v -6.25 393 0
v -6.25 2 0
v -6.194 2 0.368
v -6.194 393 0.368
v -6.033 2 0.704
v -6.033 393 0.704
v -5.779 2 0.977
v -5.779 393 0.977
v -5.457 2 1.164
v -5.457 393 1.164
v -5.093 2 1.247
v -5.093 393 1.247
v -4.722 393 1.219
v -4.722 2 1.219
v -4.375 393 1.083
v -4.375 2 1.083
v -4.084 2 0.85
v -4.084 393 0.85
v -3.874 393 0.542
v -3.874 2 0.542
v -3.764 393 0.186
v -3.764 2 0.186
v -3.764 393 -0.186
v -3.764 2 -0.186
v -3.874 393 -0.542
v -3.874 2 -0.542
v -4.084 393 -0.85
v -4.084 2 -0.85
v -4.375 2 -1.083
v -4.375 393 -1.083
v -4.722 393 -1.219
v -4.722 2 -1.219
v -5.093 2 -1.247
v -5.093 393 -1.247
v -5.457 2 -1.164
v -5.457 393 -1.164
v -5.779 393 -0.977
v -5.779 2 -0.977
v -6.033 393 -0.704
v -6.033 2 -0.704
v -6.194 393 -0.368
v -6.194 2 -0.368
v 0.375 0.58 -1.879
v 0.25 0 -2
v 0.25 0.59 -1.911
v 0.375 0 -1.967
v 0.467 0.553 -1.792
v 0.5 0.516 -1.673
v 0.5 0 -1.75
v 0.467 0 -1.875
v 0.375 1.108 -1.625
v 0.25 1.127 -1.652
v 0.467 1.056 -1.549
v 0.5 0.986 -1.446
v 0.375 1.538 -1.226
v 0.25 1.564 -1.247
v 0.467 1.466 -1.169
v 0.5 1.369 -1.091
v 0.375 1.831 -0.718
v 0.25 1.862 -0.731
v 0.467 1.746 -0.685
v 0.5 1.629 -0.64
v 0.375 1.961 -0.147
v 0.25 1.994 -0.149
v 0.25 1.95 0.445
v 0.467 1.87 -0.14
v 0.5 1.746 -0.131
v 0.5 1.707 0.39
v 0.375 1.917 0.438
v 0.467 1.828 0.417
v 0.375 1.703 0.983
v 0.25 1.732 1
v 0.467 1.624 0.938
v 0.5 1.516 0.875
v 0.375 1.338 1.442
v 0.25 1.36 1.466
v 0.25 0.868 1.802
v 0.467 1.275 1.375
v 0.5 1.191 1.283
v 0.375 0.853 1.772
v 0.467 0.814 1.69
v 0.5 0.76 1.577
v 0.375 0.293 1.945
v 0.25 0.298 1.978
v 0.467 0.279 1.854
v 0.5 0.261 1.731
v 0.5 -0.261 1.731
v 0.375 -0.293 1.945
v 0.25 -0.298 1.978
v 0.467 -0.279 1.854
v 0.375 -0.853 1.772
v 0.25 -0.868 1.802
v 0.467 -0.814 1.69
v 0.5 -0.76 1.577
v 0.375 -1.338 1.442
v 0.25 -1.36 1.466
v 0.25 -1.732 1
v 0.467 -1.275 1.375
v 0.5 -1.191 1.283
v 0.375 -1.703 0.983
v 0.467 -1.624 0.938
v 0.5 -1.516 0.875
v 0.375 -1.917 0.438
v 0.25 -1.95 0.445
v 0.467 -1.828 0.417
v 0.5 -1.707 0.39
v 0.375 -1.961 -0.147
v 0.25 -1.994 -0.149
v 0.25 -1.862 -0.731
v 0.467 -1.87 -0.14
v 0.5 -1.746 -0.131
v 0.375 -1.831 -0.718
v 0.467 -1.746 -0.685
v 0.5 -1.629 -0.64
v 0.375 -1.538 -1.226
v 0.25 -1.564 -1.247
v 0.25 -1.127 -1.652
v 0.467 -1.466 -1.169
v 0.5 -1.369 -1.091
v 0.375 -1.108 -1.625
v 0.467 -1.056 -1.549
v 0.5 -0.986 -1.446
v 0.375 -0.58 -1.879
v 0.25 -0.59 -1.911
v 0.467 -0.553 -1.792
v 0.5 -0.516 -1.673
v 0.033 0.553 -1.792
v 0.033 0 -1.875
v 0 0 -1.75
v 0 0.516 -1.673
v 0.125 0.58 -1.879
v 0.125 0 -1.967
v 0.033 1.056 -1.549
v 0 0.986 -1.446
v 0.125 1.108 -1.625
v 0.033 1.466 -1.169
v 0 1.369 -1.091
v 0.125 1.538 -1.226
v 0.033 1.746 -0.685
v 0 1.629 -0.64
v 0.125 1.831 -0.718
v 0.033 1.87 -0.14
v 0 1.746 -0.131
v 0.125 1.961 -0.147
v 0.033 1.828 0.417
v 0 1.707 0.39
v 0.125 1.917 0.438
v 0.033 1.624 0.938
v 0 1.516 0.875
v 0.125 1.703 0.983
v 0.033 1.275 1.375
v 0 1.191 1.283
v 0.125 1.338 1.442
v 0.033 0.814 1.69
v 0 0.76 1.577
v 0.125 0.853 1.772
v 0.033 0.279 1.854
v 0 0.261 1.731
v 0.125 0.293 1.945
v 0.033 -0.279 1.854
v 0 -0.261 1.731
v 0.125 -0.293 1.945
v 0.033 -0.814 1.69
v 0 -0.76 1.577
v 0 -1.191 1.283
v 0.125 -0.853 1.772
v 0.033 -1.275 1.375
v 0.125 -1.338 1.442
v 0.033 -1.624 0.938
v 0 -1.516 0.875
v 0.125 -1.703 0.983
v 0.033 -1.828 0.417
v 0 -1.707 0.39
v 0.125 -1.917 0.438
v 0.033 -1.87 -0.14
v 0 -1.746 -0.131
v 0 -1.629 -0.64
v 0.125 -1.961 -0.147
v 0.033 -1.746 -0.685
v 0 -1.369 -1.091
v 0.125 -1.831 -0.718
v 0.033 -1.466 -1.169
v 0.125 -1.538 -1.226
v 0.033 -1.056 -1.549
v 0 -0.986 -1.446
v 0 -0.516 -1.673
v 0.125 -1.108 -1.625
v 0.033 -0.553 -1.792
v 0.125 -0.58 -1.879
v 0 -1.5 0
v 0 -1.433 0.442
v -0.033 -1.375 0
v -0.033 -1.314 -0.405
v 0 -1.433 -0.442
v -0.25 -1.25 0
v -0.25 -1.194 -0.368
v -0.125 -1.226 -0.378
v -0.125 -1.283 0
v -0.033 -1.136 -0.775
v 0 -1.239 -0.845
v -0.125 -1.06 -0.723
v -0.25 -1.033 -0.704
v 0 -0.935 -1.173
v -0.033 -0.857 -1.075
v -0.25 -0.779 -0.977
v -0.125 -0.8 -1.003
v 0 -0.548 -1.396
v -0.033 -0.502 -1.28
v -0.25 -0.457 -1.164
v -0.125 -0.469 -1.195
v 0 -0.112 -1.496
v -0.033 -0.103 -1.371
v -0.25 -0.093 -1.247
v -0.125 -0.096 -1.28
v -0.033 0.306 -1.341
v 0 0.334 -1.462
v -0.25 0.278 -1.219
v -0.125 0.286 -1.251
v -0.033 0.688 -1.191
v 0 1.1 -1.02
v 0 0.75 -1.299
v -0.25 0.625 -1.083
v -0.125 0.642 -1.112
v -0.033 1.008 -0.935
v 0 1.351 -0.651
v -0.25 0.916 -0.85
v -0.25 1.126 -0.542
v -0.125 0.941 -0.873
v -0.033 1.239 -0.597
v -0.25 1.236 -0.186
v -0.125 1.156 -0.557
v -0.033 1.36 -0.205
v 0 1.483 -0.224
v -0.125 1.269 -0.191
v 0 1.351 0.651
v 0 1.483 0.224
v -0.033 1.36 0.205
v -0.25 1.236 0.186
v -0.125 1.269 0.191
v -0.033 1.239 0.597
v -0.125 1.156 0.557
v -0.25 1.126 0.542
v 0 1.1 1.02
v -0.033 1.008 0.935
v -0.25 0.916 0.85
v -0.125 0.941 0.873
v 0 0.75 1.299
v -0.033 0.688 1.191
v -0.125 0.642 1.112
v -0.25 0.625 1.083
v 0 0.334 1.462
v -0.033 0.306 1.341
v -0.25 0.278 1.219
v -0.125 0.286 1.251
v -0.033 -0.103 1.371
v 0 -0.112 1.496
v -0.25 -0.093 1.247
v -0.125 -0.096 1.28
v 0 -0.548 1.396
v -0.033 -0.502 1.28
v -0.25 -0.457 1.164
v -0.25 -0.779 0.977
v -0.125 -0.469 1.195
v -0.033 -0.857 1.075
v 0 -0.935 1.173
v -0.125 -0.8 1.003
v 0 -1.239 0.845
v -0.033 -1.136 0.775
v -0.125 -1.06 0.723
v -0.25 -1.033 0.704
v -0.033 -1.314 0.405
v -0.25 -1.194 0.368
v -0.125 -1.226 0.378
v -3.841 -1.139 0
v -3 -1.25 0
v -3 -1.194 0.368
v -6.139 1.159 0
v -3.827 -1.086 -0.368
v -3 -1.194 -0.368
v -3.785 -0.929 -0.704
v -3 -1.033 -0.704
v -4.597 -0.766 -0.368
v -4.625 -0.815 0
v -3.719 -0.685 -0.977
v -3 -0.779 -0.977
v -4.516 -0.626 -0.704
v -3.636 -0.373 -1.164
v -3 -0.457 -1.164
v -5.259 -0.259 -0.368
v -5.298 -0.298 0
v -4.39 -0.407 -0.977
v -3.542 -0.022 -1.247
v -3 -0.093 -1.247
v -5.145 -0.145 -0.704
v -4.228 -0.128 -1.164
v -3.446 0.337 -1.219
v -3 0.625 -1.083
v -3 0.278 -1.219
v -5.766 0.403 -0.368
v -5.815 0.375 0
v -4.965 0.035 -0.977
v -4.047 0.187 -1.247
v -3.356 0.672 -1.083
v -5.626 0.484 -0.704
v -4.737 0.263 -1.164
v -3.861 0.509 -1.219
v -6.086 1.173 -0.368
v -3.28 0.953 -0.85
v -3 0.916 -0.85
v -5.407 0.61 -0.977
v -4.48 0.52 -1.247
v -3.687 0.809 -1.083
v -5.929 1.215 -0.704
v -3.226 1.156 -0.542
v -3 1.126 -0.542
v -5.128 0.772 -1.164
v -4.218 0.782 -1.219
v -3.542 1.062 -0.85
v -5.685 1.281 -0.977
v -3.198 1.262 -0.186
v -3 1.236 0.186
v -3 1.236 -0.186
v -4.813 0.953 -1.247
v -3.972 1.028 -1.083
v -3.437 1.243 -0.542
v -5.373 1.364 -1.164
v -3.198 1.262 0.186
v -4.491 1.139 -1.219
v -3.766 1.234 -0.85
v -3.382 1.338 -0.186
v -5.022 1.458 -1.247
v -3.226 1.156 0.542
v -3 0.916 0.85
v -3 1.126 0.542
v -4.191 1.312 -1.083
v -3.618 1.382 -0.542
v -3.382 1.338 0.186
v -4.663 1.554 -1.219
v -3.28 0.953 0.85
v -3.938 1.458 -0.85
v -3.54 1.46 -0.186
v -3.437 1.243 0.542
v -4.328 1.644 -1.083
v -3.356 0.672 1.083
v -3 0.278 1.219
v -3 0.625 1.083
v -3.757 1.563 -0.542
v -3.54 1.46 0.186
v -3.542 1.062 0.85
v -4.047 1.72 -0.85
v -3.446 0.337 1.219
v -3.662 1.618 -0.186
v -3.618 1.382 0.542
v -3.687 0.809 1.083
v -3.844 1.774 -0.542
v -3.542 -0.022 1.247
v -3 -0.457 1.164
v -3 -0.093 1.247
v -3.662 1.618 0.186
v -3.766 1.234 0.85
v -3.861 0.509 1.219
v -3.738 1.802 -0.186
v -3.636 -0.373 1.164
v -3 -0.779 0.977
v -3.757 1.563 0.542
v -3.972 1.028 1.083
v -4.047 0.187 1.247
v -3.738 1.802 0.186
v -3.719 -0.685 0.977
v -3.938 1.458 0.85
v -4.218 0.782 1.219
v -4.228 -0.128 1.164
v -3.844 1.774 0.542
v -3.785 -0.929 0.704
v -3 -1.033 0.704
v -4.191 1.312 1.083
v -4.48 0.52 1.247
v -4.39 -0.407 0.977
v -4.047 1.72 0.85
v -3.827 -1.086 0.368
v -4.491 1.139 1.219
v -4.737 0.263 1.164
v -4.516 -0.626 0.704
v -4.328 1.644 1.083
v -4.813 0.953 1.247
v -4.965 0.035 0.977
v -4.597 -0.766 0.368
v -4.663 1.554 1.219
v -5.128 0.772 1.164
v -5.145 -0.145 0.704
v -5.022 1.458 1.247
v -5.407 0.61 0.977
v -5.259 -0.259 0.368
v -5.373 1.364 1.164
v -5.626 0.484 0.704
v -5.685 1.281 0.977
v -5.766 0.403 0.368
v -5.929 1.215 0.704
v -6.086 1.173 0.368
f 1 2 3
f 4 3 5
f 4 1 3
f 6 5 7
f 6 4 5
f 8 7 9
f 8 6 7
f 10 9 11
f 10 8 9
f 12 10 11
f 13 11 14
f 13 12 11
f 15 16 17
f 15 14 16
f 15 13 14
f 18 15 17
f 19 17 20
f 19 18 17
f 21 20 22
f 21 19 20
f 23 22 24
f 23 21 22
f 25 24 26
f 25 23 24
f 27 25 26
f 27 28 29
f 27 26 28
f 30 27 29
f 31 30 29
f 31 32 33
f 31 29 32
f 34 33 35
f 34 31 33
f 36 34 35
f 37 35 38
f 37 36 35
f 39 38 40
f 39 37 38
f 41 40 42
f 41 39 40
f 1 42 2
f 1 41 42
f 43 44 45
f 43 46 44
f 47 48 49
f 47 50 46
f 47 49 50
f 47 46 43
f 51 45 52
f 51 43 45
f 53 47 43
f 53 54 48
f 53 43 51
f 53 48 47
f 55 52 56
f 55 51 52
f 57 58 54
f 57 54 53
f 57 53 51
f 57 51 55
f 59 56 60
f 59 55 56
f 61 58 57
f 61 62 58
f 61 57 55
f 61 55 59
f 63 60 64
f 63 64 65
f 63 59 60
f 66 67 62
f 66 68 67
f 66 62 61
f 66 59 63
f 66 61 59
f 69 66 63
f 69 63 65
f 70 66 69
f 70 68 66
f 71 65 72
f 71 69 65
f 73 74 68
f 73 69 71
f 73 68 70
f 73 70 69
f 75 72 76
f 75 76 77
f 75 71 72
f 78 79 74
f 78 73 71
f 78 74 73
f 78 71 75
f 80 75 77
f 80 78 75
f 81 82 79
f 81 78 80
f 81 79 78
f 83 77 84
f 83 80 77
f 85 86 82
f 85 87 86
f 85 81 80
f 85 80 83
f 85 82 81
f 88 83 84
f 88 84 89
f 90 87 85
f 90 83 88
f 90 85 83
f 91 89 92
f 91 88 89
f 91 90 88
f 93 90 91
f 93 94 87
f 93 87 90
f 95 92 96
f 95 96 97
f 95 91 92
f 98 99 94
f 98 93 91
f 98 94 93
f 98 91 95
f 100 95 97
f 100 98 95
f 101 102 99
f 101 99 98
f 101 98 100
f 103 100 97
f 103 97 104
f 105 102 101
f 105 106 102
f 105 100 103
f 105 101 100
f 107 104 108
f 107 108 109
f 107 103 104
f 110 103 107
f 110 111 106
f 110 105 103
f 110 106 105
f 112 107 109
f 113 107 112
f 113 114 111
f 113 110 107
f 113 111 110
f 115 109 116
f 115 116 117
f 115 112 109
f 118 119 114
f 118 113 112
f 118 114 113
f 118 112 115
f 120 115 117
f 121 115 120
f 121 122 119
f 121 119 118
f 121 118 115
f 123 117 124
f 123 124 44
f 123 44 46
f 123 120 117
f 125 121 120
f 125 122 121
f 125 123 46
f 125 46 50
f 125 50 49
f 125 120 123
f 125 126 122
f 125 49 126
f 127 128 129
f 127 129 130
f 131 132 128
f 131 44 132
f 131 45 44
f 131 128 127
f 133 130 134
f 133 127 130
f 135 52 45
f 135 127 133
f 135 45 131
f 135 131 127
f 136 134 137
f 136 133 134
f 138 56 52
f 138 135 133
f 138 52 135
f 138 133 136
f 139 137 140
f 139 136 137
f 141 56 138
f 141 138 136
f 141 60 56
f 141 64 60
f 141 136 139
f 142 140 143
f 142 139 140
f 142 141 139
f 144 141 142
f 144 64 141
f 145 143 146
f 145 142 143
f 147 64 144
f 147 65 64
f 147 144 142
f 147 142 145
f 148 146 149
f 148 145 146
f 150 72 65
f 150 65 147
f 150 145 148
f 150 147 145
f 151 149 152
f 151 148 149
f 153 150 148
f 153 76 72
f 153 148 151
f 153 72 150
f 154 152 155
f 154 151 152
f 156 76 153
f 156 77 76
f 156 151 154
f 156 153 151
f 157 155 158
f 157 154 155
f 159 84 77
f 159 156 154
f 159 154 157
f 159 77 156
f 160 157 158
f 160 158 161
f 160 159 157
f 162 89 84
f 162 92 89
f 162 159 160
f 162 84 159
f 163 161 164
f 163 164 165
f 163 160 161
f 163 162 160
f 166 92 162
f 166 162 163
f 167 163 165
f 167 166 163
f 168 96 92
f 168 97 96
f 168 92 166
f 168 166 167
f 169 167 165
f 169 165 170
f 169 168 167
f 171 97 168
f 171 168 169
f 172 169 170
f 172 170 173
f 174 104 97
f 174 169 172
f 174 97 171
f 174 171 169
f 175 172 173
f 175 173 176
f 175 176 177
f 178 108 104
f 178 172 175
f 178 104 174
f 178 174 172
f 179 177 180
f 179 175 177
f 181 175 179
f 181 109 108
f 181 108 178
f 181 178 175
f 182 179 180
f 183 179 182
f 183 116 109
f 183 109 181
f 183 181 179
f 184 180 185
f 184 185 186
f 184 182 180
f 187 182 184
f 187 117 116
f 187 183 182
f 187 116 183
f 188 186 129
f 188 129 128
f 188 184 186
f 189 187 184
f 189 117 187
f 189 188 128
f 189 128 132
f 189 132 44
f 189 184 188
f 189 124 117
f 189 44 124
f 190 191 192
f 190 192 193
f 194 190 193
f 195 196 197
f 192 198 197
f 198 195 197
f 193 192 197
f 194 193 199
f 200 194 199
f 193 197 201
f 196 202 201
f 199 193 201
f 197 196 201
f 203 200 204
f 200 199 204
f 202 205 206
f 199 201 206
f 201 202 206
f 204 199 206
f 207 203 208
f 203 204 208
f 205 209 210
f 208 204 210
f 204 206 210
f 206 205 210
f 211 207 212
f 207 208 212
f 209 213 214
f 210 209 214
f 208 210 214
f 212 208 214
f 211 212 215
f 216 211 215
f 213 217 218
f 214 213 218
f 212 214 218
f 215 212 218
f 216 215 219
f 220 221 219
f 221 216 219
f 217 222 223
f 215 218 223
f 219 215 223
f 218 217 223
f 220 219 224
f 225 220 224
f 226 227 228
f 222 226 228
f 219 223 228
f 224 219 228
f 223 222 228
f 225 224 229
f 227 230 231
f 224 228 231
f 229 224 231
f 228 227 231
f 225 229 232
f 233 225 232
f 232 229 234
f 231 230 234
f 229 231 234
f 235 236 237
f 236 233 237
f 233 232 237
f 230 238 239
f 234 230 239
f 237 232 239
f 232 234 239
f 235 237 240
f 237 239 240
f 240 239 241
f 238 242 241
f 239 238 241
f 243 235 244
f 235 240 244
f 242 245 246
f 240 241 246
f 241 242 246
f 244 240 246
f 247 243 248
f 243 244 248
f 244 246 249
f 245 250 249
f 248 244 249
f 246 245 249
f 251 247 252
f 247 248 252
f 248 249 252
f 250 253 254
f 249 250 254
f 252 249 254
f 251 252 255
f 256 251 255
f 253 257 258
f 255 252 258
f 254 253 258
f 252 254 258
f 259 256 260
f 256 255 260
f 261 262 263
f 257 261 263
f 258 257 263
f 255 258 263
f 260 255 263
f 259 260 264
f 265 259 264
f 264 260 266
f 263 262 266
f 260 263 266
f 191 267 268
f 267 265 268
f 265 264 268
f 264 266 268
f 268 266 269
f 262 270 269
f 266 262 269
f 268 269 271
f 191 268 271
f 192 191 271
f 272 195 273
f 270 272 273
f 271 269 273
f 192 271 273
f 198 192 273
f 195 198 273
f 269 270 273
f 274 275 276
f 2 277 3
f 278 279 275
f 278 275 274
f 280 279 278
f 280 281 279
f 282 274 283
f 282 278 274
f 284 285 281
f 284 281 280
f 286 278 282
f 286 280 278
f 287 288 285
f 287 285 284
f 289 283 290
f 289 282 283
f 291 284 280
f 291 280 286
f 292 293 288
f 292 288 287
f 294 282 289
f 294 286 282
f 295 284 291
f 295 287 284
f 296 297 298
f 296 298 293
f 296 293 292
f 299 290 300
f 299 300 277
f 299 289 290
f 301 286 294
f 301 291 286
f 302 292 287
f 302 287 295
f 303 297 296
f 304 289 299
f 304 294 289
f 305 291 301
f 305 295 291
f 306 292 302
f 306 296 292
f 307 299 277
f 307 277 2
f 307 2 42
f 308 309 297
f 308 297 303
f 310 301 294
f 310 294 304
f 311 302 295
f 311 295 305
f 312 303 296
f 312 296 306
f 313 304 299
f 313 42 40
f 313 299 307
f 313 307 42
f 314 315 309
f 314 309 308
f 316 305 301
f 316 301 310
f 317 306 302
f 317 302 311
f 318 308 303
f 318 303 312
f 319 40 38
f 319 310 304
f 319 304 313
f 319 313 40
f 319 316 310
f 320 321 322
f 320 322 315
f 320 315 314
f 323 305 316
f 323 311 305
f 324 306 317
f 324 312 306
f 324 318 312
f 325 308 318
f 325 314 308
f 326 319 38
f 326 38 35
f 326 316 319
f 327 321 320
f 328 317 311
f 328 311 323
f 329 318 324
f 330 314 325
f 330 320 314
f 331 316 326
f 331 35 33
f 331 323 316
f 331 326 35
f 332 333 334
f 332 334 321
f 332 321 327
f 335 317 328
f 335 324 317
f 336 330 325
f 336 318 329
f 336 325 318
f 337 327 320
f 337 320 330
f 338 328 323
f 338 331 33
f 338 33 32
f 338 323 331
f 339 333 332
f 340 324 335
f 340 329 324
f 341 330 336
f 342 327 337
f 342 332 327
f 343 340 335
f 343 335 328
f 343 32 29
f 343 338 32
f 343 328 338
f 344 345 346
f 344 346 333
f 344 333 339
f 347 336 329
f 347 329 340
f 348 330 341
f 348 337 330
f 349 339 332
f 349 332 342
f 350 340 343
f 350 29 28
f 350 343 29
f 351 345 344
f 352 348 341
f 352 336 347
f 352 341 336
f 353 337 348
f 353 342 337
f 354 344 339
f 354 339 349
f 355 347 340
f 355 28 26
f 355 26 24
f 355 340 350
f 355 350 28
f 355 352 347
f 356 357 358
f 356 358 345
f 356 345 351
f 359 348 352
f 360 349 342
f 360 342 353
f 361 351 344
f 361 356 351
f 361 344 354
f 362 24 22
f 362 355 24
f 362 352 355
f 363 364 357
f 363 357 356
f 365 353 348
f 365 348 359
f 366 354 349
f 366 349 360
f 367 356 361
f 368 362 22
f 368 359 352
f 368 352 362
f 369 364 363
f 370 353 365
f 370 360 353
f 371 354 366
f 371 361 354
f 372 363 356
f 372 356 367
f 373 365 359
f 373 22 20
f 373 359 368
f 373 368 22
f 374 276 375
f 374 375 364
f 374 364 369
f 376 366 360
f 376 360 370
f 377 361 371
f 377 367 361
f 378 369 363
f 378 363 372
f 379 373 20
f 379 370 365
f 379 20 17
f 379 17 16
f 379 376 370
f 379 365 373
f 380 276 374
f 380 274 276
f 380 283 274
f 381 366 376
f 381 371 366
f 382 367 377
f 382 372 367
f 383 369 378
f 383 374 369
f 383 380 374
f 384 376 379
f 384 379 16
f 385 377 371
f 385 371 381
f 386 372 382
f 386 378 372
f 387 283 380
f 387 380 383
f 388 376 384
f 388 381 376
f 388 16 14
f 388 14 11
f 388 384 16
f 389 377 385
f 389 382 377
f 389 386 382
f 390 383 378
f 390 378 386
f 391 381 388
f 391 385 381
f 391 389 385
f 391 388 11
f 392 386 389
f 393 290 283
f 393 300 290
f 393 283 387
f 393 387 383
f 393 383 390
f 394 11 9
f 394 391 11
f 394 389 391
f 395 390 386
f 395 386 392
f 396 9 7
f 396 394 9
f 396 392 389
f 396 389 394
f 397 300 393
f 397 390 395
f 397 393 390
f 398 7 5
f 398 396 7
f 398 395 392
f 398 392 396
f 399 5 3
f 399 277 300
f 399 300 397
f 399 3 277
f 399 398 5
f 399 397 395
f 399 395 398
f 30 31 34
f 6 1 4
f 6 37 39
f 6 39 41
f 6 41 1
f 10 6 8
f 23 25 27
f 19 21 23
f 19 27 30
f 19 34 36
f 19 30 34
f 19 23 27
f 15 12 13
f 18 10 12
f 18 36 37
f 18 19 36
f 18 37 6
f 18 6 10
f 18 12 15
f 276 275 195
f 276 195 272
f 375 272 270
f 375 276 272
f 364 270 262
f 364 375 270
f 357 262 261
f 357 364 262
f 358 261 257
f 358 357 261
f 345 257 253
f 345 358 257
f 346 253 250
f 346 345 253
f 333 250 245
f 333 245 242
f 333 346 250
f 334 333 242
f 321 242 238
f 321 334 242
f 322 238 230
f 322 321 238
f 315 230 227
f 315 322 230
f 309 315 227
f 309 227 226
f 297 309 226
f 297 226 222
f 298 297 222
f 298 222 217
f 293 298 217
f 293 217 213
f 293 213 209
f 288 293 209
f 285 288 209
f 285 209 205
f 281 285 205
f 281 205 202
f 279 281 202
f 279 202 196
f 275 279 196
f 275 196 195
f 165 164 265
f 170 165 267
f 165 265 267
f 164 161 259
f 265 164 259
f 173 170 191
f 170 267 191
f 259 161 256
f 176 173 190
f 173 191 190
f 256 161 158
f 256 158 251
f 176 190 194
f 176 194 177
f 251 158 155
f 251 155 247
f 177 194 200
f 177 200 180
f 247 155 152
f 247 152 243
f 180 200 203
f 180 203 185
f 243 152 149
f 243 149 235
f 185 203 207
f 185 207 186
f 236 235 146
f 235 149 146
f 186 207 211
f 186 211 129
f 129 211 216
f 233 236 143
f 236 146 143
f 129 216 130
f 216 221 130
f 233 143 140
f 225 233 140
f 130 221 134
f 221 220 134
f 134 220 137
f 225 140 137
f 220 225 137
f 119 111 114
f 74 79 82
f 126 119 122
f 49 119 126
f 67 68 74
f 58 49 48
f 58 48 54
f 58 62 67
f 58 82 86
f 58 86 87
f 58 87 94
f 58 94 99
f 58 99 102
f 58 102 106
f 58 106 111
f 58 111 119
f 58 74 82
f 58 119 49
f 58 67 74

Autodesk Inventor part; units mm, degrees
ref_plane "YZ Plane" through (0, 0, 0) normal (1, 0, 0) x (0, 1, 0)
ref_plane "XY Plane" through (0, 0, 0) normal (0, 0, 1) x (1, 0, 0)
sketch "Boceto1" plane through (0, 0, 0) normal (0, 0, 1) x (1, 0, 0)
  line L0 (0, 0) -> (-3, 0)
  arc A0 (-5, 2) -> (-3, 0) centre (-3, 2) ccw
  line L1 (-5, 2) -> (-5, 393)
  dimension "d0" = 391
  dimension "d1" = 2
  dimension "d2" = 5
ref_plane "Plano de trabajo1" through (-5, 393, 0) normal (0, 1, 0) x (-1, 0, 0)
sketch "Boceto2" plane through (-5, 393, 0) normal (0, 1, 0) x (-1, 0, 0)
  circle A0 centre (0, 0) radius 1.25
  point P0 (-5, 0)
  point P1 (0, 0)
  point P2 (0, 0)
  point P3 (0, 0)
  dimension "d3" = 2.5
sweep "Barrido1" add profiles "Boceto2" path "Boceto1"
sketch "Boceto4" plane through (0, 0, 0) normal (1, 0, 0) x (0, 0, -1)
  point P0 (0, 0)
  point P1 (0, 0)
sketch "Boceto3" plane through (0, 0, 0) normal (1, 0, 0) x (0, 0, -1)
  circle A0 centre (0, 0) radius 2
  point P0 (0, 0)
  dimension "d6" = 4
extrude "Extrusión1" add sketch "Boceto3" along normal blind 0.5
fillet "Empalme1" radius 0.25 1 edges at (0, 1.25, 0)
fillet "Empalme2" radius 0.25 2 edges at (0, 0, 2) (0.5, 0, 2)
thread "Rosca1"
properties part number "radio" material "Acero inoxidable"
